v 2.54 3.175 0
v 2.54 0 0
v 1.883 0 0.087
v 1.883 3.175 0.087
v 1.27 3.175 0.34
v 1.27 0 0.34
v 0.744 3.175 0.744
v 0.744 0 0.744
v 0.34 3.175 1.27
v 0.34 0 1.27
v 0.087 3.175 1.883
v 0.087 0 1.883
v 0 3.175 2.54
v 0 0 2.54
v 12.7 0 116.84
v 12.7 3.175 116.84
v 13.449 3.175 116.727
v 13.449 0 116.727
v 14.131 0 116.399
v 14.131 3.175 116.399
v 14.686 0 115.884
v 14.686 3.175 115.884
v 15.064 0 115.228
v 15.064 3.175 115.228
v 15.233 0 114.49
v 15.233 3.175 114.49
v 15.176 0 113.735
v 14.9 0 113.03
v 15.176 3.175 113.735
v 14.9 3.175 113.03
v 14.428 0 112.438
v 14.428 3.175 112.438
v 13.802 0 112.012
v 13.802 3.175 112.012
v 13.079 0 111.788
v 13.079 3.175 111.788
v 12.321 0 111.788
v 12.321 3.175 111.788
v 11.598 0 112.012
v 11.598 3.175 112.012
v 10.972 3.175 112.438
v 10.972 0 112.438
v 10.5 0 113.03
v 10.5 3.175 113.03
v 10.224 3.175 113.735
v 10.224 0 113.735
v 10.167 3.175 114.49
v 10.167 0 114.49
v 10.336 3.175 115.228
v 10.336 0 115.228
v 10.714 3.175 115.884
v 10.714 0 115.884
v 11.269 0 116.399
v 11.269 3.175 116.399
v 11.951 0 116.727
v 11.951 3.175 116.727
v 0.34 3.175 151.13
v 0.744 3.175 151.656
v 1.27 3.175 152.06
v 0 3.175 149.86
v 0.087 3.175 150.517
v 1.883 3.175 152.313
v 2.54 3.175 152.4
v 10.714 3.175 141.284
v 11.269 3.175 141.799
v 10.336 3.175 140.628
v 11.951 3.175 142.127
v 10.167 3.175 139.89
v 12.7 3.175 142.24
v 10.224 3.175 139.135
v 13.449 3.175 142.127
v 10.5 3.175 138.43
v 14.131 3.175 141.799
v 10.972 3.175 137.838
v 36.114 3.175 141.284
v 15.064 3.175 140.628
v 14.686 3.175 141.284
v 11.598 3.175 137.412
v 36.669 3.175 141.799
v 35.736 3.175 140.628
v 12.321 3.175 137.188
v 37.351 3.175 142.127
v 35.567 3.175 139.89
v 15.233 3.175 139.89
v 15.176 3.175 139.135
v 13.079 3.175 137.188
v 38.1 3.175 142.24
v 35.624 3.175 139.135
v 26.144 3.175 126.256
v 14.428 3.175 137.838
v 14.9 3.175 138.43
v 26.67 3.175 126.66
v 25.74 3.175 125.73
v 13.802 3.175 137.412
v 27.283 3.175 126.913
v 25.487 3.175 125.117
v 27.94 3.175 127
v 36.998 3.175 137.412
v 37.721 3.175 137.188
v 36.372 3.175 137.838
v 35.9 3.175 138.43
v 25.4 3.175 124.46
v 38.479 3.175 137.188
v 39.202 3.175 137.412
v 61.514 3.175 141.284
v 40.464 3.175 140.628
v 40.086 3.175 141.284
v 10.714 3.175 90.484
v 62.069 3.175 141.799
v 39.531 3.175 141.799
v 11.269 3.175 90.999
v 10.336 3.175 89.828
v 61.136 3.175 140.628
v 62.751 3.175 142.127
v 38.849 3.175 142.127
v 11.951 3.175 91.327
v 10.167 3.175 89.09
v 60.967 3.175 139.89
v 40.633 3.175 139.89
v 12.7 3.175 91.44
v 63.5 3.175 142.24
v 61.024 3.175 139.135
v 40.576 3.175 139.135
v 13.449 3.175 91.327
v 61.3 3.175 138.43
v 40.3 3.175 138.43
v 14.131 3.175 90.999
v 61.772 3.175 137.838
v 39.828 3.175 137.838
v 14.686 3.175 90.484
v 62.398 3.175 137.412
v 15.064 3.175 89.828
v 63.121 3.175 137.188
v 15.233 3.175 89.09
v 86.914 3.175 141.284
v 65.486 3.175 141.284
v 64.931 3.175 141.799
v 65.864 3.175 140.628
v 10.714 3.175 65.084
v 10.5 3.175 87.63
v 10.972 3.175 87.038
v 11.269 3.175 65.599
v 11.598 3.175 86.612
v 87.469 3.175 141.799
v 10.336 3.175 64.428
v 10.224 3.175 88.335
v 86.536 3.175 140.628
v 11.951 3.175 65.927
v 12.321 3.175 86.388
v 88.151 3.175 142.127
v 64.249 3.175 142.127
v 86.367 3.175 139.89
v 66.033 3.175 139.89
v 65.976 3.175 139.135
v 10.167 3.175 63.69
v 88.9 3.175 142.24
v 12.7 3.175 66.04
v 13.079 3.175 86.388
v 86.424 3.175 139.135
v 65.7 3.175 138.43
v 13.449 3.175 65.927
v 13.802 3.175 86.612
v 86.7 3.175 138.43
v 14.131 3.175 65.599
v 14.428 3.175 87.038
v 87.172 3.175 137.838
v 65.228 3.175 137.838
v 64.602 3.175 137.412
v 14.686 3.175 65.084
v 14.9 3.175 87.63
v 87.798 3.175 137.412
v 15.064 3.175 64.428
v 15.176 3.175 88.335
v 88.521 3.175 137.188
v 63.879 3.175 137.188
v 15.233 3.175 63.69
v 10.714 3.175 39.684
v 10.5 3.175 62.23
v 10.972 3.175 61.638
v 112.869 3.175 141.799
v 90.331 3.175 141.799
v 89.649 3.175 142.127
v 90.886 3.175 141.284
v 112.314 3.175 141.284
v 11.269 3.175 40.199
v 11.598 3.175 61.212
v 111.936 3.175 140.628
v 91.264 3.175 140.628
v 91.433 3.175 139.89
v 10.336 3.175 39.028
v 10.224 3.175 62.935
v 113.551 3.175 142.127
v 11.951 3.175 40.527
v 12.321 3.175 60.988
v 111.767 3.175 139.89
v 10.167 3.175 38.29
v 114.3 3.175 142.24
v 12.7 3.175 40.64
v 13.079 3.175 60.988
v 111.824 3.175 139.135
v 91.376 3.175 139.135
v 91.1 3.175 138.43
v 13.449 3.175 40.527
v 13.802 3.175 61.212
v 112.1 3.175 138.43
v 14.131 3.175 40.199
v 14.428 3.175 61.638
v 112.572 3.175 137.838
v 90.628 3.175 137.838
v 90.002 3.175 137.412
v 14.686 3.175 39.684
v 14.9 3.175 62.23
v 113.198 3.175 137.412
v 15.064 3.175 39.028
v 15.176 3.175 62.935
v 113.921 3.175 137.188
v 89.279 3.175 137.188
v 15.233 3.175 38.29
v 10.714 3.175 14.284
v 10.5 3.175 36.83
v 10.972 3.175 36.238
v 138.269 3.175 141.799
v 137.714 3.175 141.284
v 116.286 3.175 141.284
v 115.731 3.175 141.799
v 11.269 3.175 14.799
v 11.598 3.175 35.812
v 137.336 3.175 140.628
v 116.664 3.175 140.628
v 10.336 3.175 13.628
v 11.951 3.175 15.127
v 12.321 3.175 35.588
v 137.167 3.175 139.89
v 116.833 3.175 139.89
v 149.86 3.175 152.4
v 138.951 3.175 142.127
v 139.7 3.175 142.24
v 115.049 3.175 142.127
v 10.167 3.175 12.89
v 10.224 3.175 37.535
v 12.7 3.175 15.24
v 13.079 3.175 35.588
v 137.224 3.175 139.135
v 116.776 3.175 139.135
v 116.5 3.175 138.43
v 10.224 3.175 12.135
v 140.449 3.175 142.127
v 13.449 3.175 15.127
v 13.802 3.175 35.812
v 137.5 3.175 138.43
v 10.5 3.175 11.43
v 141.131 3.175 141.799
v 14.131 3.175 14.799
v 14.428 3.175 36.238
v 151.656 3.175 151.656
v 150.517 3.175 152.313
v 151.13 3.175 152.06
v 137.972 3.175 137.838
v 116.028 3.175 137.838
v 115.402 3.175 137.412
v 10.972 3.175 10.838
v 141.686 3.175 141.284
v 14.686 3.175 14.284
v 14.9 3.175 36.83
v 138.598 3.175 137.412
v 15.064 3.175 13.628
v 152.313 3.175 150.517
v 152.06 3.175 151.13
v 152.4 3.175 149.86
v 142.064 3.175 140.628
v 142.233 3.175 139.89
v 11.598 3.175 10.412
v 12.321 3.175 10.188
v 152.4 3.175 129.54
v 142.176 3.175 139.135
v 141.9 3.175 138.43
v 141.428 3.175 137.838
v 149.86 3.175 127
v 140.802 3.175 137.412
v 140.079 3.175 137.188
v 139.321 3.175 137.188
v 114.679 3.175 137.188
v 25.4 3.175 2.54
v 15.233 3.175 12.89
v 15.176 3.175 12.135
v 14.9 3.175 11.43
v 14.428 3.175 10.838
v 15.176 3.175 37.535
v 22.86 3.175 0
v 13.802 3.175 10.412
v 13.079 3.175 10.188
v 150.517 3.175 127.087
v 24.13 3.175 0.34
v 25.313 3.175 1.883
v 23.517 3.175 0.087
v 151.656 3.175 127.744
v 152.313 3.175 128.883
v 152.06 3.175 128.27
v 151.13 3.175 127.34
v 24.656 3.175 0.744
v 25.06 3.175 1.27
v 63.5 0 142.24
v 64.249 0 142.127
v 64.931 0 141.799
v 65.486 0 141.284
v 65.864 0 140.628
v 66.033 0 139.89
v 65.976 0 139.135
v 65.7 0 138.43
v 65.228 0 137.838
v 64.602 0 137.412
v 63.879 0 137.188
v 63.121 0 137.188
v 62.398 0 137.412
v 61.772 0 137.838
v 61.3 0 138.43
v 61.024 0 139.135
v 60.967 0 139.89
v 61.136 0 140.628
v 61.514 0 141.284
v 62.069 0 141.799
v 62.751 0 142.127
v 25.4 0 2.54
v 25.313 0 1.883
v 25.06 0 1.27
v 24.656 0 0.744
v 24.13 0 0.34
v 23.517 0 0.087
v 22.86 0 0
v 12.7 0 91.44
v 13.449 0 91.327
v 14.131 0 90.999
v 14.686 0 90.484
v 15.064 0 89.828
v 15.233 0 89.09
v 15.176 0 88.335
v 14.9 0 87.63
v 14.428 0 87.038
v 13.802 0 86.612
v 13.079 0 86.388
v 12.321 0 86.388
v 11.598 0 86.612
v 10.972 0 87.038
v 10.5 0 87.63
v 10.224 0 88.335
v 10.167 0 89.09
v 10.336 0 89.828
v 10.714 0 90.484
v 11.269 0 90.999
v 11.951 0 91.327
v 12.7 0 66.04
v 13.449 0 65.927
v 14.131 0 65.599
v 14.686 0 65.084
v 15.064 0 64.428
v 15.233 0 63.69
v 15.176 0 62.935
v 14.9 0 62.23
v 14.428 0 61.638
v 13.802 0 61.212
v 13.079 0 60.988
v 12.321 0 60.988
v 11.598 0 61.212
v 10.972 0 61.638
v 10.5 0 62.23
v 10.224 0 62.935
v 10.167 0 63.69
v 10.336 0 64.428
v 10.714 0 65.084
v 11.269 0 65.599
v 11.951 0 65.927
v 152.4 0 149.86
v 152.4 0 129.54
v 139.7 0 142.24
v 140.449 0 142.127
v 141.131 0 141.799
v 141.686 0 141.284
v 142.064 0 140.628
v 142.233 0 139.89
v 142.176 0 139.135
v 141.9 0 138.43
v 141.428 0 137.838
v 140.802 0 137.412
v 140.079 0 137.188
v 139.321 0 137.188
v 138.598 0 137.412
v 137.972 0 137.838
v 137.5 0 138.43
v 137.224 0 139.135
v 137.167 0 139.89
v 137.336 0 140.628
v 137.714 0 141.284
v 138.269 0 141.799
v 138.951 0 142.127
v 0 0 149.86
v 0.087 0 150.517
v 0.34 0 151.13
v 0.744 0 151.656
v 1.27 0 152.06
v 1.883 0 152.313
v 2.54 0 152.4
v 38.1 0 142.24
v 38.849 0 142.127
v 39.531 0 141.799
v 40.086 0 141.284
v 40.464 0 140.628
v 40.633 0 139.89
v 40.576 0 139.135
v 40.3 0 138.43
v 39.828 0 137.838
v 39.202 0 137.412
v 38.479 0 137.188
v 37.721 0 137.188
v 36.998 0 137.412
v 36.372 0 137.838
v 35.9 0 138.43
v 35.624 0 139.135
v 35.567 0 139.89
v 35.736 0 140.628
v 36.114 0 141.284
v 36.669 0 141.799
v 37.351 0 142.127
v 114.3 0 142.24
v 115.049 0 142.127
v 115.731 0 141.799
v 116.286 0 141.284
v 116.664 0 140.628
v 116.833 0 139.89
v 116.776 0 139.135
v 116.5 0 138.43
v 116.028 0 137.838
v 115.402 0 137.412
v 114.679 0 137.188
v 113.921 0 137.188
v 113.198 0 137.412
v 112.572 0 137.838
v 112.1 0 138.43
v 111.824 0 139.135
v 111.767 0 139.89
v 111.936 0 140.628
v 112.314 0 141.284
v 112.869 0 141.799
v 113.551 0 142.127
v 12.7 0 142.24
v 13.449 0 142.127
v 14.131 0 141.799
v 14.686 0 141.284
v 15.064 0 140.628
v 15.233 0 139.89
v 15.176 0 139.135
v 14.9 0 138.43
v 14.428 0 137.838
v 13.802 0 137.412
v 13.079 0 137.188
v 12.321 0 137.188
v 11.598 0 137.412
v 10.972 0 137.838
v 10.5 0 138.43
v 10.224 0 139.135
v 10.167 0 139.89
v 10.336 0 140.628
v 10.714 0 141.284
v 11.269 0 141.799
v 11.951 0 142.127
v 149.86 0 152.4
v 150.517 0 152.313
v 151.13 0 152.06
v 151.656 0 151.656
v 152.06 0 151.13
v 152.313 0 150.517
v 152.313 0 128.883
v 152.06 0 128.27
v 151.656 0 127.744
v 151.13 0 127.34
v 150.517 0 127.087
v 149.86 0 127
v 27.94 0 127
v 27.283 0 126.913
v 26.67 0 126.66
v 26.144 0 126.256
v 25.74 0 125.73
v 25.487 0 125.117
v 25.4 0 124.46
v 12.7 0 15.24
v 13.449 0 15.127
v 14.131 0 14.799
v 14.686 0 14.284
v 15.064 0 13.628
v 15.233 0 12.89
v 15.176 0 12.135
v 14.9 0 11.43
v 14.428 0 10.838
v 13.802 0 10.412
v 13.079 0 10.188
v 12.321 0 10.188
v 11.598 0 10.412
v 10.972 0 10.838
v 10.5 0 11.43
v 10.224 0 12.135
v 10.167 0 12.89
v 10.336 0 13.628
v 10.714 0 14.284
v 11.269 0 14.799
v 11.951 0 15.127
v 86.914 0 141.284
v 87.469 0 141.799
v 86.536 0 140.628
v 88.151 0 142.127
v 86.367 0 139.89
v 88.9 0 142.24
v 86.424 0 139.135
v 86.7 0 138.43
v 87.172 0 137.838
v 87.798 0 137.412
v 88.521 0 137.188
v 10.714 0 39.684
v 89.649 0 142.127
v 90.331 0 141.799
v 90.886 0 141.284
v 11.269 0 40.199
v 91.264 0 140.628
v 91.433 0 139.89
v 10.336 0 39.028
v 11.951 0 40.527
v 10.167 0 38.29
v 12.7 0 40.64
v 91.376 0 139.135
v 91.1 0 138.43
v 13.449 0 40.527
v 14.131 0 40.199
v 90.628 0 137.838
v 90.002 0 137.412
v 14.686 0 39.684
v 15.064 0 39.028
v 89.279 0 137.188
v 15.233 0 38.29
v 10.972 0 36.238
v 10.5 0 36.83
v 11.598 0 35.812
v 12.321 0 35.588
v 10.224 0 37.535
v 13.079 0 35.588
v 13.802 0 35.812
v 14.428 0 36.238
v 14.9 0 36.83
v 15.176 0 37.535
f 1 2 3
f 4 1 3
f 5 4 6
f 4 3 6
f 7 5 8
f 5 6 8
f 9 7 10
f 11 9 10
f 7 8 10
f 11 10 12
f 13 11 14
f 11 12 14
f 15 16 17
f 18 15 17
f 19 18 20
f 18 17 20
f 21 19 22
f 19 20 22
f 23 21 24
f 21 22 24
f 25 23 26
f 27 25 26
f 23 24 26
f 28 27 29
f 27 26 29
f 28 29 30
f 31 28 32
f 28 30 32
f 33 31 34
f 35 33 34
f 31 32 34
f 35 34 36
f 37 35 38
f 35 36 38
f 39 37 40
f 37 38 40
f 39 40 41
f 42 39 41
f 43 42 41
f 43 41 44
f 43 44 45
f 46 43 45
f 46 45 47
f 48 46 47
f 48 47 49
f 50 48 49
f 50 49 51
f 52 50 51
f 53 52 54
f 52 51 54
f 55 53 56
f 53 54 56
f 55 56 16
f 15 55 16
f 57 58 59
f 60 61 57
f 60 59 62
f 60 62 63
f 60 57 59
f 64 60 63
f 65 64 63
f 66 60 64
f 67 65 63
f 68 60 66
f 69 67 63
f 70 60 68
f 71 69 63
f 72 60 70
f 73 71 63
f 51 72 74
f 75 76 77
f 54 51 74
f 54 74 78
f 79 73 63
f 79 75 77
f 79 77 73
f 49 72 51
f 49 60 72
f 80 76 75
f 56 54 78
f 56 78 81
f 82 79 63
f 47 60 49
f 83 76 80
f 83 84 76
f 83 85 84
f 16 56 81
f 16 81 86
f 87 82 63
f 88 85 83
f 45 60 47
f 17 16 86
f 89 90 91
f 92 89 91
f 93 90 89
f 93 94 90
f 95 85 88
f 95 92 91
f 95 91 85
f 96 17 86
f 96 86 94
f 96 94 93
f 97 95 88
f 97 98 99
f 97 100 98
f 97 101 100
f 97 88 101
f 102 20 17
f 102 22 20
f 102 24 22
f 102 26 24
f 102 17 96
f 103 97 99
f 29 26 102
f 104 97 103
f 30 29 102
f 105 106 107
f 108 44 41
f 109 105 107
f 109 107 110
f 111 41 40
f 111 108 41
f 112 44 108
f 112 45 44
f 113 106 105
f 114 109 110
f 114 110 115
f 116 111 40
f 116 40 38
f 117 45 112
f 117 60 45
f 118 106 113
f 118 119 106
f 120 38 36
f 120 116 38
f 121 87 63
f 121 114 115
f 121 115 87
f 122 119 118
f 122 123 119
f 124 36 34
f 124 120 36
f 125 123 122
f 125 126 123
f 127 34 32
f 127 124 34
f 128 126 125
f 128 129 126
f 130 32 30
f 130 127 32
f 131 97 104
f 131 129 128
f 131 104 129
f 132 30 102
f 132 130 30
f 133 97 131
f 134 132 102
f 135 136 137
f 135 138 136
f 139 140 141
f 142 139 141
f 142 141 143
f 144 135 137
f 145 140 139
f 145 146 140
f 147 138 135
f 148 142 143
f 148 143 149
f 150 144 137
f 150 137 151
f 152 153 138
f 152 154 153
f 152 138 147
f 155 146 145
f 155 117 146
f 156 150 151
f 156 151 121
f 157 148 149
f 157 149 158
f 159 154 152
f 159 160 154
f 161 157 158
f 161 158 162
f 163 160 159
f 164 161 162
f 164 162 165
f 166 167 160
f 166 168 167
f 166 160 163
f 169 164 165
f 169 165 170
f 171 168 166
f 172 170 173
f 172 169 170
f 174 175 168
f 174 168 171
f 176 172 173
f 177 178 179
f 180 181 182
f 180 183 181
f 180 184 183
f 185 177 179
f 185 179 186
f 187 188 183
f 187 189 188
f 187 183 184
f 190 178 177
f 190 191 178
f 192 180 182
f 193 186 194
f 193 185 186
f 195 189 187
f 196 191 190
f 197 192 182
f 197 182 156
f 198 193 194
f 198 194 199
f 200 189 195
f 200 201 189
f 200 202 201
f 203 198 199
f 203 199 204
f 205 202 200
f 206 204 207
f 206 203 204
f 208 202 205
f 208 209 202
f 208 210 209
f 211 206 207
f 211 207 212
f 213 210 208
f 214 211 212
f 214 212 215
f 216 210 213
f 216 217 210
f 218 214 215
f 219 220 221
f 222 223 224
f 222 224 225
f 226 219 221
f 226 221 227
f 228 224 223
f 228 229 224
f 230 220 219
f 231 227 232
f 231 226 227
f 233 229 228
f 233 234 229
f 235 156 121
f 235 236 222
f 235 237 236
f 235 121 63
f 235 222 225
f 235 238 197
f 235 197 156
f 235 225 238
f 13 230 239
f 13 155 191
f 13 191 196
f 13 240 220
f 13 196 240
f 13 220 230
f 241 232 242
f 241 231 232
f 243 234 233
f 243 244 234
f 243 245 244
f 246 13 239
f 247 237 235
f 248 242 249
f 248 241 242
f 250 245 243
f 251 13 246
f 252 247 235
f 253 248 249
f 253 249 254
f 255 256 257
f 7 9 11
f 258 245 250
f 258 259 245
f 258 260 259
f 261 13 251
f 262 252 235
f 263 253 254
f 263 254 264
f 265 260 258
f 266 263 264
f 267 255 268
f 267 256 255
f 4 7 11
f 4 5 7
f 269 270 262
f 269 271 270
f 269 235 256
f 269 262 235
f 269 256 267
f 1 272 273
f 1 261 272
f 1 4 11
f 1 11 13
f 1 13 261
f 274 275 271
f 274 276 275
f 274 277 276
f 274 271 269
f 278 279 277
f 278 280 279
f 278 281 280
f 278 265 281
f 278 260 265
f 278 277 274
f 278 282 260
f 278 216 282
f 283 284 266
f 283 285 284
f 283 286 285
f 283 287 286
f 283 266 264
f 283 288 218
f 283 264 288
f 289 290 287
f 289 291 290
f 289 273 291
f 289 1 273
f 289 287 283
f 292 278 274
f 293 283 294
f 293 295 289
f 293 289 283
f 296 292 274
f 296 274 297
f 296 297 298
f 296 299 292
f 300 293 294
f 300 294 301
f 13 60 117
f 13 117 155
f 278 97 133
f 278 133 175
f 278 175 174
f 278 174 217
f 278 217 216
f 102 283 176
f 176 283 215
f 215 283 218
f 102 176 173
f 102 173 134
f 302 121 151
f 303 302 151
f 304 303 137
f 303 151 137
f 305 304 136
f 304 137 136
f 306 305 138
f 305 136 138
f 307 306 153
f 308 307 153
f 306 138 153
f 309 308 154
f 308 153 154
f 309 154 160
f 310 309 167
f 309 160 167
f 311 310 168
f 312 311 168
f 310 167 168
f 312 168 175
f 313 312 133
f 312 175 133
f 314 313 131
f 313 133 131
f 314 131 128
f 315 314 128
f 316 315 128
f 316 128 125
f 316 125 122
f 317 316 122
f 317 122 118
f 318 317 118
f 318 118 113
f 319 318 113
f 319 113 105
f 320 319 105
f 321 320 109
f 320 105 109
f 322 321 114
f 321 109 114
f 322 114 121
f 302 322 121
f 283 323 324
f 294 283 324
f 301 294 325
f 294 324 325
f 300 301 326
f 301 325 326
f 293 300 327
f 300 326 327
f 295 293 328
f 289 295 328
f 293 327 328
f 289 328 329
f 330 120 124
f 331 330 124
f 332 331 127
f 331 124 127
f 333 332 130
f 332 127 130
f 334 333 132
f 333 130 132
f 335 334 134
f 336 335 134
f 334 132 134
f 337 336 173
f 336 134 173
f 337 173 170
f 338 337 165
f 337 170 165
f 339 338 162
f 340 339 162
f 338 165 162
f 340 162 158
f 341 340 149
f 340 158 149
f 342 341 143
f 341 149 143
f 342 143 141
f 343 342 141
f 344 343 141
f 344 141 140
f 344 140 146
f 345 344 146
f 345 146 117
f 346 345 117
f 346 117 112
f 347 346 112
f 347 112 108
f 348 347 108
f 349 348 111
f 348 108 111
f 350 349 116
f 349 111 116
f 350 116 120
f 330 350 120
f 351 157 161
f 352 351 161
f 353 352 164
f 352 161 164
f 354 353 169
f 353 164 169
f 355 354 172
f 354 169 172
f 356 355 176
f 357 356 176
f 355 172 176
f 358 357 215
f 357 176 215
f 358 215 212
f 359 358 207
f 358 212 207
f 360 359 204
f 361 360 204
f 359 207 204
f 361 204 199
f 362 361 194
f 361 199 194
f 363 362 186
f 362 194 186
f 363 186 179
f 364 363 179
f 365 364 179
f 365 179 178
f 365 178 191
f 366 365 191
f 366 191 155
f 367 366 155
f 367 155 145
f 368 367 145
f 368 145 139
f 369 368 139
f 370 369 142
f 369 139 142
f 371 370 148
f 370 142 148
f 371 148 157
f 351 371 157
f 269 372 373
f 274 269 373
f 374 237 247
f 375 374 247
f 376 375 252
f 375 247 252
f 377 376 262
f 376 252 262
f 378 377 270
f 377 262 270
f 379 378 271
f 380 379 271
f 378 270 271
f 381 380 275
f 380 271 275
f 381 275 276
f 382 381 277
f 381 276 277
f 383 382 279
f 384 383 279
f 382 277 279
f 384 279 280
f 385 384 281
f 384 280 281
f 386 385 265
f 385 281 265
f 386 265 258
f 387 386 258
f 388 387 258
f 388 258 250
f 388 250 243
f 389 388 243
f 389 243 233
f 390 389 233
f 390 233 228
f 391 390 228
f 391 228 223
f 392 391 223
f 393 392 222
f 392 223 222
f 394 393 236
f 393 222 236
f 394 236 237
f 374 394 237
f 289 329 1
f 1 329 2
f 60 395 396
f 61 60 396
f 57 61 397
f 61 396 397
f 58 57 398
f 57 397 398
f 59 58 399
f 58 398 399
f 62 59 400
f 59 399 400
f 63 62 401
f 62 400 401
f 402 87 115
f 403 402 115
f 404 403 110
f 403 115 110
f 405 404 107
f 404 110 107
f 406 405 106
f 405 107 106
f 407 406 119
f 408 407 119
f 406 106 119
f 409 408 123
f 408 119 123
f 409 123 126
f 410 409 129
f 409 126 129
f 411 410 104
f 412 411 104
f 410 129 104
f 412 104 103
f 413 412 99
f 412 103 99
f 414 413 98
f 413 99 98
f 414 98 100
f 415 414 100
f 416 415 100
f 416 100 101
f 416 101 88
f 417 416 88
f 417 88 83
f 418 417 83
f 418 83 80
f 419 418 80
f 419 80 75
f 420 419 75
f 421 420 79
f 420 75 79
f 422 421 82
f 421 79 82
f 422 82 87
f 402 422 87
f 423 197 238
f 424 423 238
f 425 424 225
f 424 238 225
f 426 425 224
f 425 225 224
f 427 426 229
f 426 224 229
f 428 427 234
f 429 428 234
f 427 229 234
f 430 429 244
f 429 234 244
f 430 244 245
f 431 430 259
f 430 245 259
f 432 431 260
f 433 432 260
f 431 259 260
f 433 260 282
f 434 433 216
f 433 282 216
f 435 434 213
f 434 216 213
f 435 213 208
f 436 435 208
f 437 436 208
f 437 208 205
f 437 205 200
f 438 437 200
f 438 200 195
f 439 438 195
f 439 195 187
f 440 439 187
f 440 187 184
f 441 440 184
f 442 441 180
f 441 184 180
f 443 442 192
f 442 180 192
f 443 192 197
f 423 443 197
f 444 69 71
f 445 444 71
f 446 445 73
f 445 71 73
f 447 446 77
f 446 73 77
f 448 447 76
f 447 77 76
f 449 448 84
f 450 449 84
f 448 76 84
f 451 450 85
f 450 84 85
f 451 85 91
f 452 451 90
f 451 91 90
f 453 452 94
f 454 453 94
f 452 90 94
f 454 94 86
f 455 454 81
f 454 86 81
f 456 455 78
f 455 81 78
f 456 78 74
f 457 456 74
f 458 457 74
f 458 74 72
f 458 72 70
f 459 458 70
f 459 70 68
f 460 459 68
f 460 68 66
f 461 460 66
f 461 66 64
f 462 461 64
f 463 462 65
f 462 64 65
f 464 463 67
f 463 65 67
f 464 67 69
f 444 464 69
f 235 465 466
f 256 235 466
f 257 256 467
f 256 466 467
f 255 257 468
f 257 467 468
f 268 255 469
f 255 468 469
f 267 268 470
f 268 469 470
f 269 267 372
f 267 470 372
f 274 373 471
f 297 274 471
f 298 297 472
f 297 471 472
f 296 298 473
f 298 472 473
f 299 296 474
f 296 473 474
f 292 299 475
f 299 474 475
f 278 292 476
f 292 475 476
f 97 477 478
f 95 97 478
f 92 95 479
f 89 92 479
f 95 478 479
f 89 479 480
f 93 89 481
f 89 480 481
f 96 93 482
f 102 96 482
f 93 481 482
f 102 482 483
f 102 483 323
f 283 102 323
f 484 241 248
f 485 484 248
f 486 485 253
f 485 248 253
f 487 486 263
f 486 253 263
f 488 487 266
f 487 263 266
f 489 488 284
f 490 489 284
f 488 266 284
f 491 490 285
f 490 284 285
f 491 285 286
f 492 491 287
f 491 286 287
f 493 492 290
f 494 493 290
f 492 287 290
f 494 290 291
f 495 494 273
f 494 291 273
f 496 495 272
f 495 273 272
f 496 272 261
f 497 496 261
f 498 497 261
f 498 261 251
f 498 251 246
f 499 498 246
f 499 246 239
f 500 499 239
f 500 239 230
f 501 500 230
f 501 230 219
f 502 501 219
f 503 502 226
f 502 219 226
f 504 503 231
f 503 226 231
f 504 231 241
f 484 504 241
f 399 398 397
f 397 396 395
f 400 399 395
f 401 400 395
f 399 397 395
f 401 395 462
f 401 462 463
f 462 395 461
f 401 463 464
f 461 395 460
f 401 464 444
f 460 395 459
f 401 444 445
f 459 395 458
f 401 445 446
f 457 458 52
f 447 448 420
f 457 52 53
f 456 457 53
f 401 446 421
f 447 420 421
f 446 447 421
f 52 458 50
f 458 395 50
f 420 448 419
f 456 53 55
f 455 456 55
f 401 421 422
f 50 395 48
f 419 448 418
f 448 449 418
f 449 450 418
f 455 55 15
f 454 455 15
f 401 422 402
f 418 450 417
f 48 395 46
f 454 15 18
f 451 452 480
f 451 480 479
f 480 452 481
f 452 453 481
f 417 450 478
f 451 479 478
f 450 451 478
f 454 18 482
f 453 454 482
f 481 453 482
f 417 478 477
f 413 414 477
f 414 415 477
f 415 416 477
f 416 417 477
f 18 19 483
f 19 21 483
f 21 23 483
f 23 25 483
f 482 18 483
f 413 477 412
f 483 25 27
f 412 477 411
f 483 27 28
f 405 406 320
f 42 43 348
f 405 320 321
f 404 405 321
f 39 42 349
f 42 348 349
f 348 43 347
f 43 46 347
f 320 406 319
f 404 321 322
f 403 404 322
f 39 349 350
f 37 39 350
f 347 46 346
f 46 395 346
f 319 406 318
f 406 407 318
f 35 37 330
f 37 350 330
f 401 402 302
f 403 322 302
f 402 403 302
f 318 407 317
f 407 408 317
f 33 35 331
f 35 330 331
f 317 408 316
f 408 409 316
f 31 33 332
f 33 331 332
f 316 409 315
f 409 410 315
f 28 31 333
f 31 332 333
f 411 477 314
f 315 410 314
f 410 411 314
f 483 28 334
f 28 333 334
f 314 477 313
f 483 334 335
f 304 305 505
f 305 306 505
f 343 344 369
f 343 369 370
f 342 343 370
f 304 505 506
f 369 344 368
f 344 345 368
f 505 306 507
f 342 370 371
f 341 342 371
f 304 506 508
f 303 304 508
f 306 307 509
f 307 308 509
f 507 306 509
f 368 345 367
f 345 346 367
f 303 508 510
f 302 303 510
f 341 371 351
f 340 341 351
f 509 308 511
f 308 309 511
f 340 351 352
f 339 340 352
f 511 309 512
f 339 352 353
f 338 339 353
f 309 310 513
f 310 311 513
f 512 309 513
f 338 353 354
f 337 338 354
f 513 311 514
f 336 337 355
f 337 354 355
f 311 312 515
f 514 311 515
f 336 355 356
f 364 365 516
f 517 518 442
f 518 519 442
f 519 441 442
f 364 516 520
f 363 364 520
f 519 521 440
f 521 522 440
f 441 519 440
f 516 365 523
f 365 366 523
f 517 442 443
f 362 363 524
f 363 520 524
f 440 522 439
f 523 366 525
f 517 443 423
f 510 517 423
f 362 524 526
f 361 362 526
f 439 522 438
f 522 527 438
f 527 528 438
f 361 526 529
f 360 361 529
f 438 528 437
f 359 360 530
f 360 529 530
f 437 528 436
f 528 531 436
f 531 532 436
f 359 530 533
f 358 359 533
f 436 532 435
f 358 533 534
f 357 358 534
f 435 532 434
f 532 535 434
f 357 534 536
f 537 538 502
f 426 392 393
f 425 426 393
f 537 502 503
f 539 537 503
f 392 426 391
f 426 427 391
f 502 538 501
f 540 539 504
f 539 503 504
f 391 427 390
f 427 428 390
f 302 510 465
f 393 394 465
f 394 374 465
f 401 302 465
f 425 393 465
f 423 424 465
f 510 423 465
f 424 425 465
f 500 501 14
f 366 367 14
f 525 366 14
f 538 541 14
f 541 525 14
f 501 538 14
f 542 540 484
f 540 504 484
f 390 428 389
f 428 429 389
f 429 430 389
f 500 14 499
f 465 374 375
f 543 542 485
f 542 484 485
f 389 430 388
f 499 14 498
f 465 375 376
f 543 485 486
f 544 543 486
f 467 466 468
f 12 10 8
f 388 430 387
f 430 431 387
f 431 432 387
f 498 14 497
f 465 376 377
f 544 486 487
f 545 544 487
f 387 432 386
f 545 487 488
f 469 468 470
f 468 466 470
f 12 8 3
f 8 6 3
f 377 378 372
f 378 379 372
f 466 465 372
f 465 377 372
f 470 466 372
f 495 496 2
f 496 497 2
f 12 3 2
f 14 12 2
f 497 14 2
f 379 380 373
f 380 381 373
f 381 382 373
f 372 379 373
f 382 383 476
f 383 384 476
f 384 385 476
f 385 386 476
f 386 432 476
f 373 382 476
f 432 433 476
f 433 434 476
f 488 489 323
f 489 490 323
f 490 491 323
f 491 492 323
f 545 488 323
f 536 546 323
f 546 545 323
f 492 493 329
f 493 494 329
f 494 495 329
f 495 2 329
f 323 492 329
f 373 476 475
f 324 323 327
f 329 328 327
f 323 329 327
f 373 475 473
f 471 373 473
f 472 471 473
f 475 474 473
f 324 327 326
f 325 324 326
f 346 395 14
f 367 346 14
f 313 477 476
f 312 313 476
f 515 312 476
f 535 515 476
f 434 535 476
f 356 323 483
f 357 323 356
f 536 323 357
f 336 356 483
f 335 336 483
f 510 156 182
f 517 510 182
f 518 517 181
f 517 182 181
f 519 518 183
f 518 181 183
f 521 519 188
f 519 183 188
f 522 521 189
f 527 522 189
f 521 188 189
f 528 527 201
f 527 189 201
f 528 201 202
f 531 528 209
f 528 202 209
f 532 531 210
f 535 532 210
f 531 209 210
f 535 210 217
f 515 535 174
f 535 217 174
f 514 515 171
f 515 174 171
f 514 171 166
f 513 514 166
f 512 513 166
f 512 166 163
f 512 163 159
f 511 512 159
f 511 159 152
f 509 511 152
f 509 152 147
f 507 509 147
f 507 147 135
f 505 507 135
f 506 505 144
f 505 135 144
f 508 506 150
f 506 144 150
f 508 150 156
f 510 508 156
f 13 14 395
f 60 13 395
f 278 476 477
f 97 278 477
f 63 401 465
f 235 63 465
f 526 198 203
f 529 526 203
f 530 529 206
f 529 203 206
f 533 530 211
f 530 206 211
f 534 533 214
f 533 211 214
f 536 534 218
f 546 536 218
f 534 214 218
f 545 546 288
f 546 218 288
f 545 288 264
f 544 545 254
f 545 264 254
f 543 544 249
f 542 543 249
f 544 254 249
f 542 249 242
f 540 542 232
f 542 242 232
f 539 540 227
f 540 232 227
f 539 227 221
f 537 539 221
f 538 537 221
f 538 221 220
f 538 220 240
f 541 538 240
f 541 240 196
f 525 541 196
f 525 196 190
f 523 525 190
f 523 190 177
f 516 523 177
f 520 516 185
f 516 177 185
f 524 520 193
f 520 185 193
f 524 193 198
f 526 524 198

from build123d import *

# Parameters (mm, degrees)
BOSS_EXTRUDE1_DEPTH = 3.175
SKETCH2_R           = 2.54
CUT_EXTRUDE1_DEPTH  = 3.175
LPATTERN1_COUNT     = 6
LPATTERN1_PITCH     = 25.4
SKETCH3_R           = 2.54
CUT_EXTRUDE2_DEPTH  = 3.175
LPATTERN2_COUNT     = 5
LPATTERN2_PITCH     = 25.4


with BuildPart() as part:
    # Sketch1 → Boss-Extrude1 (new body)
    with BuildSketch(Plane(origin=(0, 0, 0), x_dir=(1, 0, 0), z_dir=(0, 1, 0))):
        with BuildLine():
            Line((0, -2.54), (0, -149.86))
            ThreePointArc((0, -149.86), (0.743948776, -151.656051224), (2.54, -152.4))
            Line((2.54, -152.4), (149.86, -152.4))
            ThreePointArc((149.86, -152.4), (151.656051224, -151.656051224), (152.4, -149.86))
            Line((152.4, -149.86), (152.4, -129.54))
            ThreePointArc((152.4, -129.54), (151.656051224, -127.743948776), (149.86, -127))
            Line((149.86, -127), (27.94, -127))
            ThreePointArc((27.94, -127), (26.143948776, -126.256051224), (25.4, -124.46))
            Line((25.4, -124.46), (25.4, -2.54))
            ThreePointArc((25.4, -2.54), (24.656051224, -0.743948776), (22.86, 0))
            Line((22.86, 0), (2.54, 0))
            ThreePointArc((2.54, 0), (0.743948776, -0.743948776), (0, -2.54))
        make_face()
    extrude(amount=BOSS_EXTRUDE1_DEPTH)

    # Sketch2 → Cut-Extrude1 (cut)
    with BuildSketch(Plane(origin=(0, 3.175, 0), x_dir=(1, 0, 0), z_dir=(0, 1, 0))):
        with Locations(Location((12.7, -12.7, 0), (0, 0, 270))):
            Circle(SKETCH2_R)
    cut_extrude1 = extrude(amount=-CUT_EXTRUDE1_DEPTH, mode=Mode.SUBTRACT)

    # LPattern1: Cut-Extrude1 ×6
    with Locations(*[(0, 0, i * LPATTERN1_PITCH) for i in range(1, LPATTERN1_COUNT)]):
        add(cut_extrude1, mode=Mode.SUBTRACT)

    # Sketch3 → Cut-Extrude2 (cut)
    with BuildSketch(Plane(origin=(0, 3.175, 0), x_dir=(1, 0, 0), z_dir=(0, 1, 0))):
        with Locations(Location((139.7, -139.7, 0), (0, 0, 270))):
            Circle(SKETCH3_R)
    cut_extrude2 = extrude(amount=-CUT_EXTRUDE2_DEPTH, mode=Mode.SUBTRACT)

    # LPattern2: Cut-Extrude2 ×5
    with Locations(*[(-i * LPATTERN2_PITCH, 0, 0) for i in range(1, LPATTERN2_COUNT)]):
        add(cut_extrude2, mode=Mode.SUBTRACT)


solid = part.part
